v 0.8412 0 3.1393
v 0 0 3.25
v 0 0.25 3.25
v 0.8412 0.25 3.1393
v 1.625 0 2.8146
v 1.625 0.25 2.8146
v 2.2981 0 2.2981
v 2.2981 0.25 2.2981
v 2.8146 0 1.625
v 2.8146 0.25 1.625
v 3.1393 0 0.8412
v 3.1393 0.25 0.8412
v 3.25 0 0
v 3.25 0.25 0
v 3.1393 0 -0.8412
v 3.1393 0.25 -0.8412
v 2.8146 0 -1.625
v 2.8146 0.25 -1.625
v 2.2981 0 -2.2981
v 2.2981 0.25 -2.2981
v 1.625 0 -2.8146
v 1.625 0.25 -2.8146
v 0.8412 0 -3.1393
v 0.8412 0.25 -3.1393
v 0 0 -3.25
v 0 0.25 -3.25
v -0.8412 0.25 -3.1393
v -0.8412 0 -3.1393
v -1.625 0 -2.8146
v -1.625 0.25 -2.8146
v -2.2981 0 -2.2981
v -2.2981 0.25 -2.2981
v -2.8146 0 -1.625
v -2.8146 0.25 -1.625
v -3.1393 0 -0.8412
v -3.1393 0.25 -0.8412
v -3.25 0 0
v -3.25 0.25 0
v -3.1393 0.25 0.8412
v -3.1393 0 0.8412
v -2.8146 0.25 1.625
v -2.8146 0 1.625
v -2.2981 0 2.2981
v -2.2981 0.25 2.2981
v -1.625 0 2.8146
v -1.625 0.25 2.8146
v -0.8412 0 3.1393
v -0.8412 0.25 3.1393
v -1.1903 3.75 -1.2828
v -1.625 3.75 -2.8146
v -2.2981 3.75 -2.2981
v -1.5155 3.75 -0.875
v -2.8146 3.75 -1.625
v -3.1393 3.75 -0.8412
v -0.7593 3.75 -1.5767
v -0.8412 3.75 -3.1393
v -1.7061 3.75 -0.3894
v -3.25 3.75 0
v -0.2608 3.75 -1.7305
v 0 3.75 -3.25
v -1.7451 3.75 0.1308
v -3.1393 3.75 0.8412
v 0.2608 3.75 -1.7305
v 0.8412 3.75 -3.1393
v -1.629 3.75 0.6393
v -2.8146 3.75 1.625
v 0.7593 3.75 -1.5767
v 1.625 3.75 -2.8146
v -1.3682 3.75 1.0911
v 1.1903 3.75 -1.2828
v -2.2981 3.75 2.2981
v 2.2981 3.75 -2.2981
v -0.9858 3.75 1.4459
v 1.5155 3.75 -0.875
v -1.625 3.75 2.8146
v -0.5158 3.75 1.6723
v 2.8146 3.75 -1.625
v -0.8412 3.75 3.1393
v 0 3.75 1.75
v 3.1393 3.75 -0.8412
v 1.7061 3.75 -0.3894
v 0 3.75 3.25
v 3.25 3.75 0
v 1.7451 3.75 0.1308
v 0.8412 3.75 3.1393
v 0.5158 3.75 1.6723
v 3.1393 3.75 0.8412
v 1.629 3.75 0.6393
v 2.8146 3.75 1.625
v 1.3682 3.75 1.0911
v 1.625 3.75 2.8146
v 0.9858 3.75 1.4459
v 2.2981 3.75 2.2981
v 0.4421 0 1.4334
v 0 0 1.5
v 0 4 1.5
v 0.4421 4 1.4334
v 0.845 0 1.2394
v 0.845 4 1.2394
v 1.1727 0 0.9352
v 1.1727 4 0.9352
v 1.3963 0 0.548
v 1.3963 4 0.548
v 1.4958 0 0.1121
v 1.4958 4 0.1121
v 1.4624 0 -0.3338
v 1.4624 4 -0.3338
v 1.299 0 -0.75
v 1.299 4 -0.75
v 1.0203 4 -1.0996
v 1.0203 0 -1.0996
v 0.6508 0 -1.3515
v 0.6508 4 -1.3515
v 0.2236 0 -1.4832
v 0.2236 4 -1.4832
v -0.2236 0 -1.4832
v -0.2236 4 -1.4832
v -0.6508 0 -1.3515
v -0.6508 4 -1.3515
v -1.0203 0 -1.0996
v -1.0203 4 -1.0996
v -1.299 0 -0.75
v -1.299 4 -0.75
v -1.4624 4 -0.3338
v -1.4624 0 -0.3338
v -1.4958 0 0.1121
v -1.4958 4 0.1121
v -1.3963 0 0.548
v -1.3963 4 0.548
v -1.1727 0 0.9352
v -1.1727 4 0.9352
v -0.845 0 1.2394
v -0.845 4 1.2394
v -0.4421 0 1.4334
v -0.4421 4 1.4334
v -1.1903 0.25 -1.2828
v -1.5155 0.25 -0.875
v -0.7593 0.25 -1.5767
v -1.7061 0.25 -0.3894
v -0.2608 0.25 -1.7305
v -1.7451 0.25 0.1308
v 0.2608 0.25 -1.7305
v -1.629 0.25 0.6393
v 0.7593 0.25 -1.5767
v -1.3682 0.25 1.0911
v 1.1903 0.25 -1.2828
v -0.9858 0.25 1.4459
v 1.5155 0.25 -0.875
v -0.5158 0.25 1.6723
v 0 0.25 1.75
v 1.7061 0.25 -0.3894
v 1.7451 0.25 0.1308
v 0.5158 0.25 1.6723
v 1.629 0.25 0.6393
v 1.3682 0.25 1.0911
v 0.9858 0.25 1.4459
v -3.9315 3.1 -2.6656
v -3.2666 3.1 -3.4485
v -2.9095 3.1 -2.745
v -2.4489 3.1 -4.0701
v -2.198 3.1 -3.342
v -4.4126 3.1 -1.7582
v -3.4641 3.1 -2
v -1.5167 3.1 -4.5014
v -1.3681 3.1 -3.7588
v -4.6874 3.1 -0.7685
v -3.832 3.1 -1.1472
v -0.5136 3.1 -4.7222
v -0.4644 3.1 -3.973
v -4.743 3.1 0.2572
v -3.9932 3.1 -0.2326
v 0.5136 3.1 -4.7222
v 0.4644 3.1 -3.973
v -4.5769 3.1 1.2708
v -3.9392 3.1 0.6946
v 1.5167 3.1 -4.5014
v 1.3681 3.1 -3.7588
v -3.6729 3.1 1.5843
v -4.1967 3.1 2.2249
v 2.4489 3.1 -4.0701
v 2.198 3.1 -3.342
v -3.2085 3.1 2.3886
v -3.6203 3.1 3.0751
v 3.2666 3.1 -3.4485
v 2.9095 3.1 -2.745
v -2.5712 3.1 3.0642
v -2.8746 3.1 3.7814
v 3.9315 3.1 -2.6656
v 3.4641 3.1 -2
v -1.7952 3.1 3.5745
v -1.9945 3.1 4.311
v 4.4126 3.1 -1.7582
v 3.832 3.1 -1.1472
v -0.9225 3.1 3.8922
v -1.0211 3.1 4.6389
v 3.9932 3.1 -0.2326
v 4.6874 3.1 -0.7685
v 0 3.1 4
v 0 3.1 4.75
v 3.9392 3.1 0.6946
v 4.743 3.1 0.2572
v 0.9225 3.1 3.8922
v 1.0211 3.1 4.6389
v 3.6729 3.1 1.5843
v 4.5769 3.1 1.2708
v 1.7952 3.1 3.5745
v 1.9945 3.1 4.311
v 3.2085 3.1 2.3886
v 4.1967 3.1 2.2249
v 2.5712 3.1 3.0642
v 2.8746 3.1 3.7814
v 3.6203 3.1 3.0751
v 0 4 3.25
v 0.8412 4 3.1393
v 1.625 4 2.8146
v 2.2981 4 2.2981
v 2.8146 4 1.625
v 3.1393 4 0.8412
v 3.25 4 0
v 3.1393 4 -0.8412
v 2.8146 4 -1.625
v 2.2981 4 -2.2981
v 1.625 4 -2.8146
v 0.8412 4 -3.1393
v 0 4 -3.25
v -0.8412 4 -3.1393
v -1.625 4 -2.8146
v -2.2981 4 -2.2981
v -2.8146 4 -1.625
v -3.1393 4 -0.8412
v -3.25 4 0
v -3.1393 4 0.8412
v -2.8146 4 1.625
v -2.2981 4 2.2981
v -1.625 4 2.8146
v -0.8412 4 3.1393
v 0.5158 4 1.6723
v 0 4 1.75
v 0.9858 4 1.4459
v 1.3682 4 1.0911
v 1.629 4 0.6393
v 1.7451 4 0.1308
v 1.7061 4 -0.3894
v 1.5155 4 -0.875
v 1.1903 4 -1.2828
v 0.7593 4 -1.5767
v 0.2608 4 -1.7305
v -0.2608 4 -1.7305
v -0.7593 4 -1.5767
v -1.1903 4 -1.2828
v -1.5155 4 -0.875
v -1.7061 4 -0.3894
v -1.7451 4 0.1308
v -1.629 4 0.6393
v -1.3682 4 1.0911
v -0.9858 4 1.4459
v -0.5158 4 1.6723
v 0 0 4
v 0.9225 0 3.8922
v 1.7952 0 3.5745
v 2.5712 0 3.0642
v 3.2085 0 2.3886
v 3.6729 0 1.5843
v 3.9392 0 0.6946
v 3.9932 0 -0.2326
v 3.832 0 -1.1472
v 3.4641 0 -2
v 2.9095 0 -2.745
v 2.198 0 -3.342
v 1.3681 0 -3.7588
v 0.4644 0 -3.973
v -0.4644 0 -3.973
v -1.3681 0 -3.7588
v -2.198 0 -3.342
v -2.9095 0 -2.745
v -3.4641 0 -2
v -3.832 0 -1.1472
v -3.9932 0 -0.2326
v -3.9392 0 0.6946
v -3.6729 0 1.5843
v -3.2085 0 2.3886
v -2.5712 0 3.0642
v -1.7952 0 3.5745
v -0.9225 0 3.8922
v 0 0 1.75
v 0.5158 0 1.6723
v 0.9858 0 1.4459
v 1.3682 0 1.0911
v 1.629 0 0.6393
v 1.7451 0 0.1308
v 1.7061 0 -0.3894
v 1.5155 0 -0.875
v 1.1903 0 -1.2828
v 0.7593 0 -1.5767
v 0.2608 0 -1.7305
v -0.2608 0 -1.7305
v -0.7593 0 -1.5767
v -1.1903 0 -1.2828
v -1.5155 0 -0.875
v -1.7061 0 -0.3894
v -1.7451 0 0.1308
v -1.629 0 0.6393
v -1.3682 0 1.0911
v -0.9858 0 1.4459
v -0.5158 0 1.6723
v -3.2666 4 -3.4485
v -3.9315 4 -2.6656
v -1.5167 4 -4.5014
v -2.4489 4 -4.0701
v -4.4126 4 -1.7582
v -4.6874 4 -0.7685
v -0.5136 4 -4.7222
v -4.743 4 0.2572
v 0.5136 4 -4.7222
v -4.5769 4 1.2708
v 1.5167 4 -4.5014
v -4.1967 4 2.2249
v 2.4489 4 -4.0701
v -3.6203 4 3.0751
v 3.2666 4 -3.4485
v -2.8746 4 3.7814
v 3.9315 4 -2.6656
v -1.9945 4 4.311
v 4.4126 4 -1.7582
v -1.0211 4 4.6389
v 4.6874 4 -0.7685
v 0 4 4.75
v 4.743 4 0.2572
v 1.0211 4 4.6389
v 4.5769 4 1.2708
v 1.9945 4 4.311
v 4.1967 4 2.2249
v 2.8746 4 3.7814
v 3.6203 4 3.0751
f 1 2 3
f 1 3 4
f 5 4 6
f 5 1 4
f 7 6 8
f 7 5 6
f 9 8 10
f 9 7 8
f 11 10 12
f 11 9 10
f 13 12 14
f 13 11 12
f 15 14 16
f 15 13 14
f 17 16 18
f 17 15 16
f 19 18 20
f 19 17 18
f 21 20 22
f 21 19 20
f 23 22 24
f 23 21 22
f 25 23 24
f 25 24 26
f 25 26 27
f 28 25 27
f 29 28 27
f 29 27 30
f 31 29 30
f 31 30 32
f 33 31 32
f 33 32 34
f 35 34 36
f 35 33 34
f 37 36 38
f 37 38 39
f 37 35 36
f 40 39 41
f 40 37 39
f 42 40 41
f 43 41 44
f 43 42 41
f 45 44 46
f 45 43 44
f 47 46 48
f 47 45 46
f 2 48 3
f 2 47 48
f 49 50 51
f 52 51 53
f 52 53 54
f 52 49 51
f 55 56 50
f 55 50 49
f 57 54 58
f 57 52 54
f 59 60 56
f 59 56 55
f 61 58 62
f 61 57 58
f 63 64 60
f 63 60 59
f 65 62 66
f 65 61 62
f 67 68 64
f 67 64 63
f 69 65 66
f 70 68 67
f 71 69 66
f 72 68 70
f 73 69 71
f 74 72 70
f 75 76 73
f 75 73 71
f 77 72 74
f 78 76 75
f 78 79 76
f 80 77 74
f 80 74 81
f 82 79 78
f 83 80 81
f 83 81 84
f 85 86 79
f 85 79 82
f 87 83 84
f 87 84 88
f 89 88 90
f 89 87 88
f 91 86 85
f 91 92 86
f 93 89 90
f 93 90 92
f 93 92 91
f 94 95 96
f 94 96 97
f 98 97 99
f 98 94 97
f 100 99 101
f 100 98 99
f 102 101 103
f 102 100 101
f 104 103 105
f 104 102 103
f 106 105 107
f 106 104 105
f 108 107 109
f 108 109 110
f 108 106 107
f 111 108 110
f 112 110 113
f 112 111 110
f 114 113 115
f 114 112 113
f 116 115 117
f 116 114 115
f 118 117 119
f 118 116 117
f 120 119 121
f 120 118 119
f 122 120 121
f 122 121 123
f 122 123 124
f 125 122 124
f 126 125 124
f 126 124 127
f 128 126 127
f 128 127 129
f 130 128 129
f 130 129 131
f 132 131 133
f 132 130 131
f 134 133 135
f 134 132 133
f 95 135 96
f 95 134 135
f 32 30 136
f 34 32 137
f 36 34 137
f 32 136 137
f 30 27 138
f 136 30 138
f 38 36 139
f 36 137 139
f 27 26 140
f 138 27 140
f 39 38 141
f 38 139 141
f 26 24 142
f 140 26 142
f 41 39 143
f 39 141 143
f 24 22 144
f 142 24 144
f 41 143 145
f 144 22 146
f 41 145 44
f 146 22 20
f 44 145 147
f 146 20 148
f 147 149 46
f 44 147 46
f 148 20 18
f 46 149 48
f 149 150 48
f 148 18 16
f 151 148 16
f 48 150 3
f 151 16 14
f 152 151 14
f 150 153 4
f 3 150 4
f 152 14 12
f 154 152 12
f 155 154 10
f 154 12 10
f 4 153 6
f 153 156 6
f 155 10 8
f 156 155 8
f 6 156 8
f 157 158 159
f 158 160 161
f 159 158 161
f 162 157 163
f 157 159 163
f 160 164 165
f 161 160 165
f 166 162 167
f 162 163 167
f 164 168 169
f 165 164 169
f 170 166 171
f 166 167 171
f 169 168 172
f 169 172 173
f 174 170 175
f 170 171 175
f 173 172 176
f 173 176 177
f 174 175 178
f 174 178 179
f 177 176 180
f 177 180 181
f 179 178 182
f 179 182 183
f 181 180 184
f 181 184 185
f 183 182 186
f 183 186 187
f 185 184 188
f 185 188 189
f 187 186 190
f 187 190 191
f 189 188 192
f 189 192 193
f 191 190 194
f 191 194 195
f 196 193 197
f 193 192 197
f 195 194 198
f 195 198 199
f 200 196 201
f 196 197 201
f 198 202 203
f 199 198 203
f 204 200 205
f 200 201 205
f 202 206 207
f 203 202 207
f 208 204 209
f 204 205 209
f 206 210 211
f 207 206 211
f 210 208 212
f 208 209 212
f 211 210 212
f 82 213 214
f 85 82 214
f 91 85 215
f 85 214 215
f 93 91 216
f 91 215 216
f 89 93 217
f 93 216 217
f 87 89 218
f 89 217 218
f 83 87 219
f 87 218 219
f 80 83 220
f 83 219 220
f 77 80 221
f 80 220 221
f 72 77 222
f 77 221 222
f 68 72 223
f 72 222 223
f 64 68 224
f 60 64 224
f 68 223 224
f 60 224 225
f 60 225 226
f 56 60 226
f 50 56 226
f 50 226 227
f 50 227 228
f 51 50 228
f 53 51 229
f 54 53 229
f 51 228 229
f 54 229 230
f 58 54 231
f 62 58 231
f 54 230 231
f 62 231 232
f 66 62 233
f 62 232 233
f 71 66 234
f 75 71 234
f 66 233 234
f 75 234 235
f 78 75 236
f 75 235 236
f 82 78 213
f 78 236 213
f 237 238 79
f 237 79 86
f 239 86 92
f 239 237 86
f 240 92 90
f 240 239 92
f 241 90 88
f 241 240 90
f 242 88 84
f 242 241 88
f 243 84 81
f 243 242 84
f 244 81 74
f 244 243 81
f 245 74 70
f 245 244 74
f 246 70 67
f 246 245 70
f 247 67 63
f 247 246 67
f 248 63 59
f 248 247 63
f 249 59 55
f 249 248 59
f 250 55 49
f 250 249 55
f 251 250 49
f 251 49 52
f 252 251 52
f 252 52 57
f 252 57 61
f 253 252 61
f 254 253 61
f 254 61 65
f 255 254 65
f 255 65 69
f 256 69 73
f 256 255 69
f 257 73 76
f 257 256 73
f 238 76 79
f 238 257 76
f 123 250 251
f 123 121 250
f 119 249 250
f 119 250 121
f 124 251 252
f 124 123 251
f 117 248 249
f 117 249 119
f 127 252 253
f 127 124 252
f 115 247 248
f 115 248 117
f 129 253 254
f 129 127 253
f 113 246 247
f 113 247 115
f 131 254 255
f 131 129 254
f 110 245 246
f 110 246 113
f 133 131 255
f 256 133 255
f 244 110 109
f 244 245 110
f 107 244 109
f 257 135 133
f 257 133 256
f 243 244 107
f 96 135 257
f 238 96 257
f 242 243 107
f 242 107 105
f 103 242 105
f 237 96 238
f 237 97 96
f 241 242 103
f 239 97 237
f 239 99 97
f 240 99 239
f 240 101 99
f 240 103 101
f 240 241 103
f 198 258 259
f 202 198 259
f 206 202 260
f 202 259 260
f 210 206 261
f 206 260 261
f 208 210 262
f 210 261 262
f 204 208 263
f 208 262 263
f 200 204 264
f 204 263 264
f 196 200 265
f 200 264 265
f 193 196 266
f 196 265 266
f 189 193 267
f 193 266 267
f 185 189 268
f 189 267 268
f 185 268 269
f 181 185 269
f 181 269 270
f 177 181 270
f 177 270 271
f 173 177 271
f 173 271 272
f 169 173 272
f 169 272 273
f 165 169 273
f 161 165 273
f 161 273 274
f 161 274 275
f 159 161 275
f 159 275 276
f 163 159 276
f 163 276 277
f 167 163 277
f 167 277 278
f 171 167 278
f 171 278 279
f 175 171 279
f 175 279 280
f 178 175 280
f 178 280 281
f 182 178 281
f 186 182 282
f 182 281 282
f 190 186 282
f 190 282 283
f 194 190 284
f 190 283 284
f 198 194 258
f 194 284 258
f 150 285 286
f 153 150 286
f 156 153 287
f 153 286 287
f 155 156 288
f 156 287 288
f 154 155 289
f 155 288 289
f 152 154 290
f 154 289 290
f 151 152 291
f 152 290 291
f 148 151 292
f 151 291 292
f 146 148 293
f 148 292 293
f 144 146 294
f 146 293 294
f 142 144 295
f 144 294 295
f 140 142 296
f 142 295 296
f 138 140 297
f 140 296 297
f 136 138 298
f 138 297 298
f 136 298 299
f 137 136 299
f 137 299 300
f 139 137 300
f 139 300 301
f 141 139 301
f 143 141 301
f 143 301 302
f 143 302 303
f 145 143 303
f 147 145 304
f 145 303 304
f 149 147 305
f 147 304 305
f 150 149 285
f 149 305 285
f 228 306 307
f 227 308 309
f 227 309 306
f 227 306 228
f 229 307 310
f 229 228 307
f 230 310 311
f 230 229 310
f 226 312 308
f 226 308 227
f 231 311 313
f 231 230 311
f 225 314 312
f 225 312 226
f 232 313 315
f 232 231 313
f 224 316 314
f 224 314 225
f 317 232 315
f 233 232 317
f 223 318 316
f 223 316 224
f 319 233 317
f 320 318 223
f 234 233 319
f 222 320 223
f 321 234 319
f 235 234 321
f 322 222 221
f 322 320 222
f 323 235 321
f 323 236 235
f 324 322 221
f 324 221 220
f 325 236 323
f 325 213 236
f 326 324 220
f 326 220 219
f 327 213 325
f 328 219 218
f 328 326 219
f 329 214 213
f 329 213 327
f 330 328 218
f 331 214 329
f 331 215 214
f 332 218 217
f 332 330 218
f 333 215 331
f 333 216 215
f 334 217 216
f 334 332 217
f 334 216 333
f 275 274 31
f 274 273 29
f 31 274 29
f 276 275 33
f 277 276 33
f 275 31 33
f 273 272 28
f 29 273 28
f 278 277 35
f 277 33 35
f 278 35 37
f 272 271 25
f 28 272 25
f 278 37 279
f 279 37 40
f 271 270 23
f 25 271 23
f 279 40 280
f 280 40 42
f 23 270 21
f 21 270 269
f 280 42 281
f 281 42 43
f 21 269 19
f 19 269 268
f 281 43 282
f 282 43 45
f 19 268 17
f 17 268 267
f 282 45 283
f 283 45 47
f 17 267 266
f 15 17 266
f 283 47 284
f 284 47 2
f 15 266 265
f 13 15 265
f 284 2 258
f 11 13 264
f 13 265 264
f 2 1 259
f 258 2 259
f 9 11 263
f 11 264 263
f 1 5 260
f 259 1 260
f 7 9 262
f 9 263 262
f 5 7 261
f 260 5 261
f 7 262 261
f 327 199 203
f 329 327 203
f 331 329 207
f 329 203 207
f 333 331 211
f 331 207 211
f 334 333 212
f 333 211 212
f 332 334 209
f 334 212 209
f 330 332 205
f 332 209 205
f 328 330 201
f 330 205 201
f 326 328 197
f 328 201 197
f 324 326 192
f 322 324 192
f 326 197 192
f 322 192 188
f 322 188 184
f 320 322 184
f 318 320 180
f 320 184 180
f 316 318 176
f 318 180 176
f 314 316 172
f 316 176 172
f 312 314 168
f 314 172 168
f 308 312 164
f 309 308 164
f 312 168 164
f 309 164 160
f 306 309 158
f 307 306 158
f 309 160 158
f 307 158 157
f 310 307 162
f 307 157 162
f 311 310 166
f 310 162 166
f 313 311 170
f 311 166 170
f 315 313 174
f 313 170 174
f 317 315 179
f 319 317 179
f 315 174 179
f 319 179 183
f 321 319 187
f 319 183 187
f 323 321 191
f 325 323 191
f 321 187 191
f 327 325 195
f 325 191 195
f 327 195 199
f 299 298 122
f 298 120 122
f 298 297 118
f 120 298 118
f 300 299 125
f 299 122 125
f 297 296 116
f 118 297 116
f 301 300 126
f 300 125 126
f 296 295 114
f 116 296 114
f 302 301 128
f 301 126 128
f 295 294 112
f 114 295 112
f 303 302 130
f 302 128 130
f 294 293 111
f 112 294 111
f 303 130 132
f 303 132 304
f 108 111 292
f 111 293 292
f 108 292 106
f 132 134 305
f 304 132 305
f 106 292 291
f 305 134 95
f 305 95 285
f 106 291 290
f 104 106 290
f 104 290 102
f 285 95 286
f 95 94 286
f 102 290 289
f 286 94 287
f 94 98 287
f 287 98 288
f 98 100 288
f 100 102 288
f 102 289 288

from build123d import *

# Parameters (mm, degrees)
SKETCH1_R           = 4
SKETCH1_R_2         = 1.5
BOSS_EXTRUDE1_DEPTH = 4
SKETCH2_R           = 3.25
SKETCH2_R_2         = 1.75
CUT_EXTRUDE1_DEPTH  = 0.25
BOSS_EXTRUDE2_START = -0.9
SKETCH3_R           = 4.75
SKETCH3_R_2         = 4
BOSS_EXTRUDE2_DEPTH = 0.9


with BuildPart() as part:
    # Sketch1 → Boss-Extrude1 (new body)
    with BuildSketch(Plane(origin=(0, 0, 0), x_dir=(1, 0, 0), z_dir=(0, 1, 0))):
        with Locations(Location((0, 0, 0), (0, 0, 270))):
            Circle(SKETCH1_R)
        with Locations(Location((0, 0, 0), (0, 0, 270))):
            Circle(SKETCH1_R_2, mode=Mode.SUBTRACT)
    extrude(amount=BOSS_EXTRUDE1_DEPTH)

    # Sketch2 → Cut-Extrude1 (cut)
    with BuildSketch(Plane(origin=(0, 4, 0), x_dir=(1, 0, 0), z_dir=(0, 1, 0))):
        with Locations(Location((0, 0, 0), (0, 0, 270))):
            Circle(SKETCH2_R)
        with Locations(Location((0, 0, 0), (0, 0, 270))):
            Circle(SKETCH2_R_2, mode=Mode.SUBTRACT)
    cut_extrude1 = extrude(amount=-CUT_EXTRUDE1_DEPTH, mode=Mode.SUBTRACT)

    # Mirror1: Cut-Extrude1 across plane
    add(cut_extrude1.mirror(Plane.ZX.offset(2)), mode=Mode.SUBTRACT)

    # Sketch3 → Boss-Extrude2 (add)
    with BuildSketch(Plane(origin=(0, 4, 0), x_dir=(1, 0, 0), z_dir=(0, 1, 0)).offset(BOSS_EXTRUDE2_START)):
        with Locations(Location((0, 0, 0), (0, 0, 270))):
            Circle(SKETCH3_R)
        with Locations(Location((0, 0, 0), (0, 0, 270))):
            Circle(SKETCH3_R_2, mode=Mode.SUBTRACT)
    extrude(amount=BOSS_EXTRUDE2_DEPTH)


solid = part.part
